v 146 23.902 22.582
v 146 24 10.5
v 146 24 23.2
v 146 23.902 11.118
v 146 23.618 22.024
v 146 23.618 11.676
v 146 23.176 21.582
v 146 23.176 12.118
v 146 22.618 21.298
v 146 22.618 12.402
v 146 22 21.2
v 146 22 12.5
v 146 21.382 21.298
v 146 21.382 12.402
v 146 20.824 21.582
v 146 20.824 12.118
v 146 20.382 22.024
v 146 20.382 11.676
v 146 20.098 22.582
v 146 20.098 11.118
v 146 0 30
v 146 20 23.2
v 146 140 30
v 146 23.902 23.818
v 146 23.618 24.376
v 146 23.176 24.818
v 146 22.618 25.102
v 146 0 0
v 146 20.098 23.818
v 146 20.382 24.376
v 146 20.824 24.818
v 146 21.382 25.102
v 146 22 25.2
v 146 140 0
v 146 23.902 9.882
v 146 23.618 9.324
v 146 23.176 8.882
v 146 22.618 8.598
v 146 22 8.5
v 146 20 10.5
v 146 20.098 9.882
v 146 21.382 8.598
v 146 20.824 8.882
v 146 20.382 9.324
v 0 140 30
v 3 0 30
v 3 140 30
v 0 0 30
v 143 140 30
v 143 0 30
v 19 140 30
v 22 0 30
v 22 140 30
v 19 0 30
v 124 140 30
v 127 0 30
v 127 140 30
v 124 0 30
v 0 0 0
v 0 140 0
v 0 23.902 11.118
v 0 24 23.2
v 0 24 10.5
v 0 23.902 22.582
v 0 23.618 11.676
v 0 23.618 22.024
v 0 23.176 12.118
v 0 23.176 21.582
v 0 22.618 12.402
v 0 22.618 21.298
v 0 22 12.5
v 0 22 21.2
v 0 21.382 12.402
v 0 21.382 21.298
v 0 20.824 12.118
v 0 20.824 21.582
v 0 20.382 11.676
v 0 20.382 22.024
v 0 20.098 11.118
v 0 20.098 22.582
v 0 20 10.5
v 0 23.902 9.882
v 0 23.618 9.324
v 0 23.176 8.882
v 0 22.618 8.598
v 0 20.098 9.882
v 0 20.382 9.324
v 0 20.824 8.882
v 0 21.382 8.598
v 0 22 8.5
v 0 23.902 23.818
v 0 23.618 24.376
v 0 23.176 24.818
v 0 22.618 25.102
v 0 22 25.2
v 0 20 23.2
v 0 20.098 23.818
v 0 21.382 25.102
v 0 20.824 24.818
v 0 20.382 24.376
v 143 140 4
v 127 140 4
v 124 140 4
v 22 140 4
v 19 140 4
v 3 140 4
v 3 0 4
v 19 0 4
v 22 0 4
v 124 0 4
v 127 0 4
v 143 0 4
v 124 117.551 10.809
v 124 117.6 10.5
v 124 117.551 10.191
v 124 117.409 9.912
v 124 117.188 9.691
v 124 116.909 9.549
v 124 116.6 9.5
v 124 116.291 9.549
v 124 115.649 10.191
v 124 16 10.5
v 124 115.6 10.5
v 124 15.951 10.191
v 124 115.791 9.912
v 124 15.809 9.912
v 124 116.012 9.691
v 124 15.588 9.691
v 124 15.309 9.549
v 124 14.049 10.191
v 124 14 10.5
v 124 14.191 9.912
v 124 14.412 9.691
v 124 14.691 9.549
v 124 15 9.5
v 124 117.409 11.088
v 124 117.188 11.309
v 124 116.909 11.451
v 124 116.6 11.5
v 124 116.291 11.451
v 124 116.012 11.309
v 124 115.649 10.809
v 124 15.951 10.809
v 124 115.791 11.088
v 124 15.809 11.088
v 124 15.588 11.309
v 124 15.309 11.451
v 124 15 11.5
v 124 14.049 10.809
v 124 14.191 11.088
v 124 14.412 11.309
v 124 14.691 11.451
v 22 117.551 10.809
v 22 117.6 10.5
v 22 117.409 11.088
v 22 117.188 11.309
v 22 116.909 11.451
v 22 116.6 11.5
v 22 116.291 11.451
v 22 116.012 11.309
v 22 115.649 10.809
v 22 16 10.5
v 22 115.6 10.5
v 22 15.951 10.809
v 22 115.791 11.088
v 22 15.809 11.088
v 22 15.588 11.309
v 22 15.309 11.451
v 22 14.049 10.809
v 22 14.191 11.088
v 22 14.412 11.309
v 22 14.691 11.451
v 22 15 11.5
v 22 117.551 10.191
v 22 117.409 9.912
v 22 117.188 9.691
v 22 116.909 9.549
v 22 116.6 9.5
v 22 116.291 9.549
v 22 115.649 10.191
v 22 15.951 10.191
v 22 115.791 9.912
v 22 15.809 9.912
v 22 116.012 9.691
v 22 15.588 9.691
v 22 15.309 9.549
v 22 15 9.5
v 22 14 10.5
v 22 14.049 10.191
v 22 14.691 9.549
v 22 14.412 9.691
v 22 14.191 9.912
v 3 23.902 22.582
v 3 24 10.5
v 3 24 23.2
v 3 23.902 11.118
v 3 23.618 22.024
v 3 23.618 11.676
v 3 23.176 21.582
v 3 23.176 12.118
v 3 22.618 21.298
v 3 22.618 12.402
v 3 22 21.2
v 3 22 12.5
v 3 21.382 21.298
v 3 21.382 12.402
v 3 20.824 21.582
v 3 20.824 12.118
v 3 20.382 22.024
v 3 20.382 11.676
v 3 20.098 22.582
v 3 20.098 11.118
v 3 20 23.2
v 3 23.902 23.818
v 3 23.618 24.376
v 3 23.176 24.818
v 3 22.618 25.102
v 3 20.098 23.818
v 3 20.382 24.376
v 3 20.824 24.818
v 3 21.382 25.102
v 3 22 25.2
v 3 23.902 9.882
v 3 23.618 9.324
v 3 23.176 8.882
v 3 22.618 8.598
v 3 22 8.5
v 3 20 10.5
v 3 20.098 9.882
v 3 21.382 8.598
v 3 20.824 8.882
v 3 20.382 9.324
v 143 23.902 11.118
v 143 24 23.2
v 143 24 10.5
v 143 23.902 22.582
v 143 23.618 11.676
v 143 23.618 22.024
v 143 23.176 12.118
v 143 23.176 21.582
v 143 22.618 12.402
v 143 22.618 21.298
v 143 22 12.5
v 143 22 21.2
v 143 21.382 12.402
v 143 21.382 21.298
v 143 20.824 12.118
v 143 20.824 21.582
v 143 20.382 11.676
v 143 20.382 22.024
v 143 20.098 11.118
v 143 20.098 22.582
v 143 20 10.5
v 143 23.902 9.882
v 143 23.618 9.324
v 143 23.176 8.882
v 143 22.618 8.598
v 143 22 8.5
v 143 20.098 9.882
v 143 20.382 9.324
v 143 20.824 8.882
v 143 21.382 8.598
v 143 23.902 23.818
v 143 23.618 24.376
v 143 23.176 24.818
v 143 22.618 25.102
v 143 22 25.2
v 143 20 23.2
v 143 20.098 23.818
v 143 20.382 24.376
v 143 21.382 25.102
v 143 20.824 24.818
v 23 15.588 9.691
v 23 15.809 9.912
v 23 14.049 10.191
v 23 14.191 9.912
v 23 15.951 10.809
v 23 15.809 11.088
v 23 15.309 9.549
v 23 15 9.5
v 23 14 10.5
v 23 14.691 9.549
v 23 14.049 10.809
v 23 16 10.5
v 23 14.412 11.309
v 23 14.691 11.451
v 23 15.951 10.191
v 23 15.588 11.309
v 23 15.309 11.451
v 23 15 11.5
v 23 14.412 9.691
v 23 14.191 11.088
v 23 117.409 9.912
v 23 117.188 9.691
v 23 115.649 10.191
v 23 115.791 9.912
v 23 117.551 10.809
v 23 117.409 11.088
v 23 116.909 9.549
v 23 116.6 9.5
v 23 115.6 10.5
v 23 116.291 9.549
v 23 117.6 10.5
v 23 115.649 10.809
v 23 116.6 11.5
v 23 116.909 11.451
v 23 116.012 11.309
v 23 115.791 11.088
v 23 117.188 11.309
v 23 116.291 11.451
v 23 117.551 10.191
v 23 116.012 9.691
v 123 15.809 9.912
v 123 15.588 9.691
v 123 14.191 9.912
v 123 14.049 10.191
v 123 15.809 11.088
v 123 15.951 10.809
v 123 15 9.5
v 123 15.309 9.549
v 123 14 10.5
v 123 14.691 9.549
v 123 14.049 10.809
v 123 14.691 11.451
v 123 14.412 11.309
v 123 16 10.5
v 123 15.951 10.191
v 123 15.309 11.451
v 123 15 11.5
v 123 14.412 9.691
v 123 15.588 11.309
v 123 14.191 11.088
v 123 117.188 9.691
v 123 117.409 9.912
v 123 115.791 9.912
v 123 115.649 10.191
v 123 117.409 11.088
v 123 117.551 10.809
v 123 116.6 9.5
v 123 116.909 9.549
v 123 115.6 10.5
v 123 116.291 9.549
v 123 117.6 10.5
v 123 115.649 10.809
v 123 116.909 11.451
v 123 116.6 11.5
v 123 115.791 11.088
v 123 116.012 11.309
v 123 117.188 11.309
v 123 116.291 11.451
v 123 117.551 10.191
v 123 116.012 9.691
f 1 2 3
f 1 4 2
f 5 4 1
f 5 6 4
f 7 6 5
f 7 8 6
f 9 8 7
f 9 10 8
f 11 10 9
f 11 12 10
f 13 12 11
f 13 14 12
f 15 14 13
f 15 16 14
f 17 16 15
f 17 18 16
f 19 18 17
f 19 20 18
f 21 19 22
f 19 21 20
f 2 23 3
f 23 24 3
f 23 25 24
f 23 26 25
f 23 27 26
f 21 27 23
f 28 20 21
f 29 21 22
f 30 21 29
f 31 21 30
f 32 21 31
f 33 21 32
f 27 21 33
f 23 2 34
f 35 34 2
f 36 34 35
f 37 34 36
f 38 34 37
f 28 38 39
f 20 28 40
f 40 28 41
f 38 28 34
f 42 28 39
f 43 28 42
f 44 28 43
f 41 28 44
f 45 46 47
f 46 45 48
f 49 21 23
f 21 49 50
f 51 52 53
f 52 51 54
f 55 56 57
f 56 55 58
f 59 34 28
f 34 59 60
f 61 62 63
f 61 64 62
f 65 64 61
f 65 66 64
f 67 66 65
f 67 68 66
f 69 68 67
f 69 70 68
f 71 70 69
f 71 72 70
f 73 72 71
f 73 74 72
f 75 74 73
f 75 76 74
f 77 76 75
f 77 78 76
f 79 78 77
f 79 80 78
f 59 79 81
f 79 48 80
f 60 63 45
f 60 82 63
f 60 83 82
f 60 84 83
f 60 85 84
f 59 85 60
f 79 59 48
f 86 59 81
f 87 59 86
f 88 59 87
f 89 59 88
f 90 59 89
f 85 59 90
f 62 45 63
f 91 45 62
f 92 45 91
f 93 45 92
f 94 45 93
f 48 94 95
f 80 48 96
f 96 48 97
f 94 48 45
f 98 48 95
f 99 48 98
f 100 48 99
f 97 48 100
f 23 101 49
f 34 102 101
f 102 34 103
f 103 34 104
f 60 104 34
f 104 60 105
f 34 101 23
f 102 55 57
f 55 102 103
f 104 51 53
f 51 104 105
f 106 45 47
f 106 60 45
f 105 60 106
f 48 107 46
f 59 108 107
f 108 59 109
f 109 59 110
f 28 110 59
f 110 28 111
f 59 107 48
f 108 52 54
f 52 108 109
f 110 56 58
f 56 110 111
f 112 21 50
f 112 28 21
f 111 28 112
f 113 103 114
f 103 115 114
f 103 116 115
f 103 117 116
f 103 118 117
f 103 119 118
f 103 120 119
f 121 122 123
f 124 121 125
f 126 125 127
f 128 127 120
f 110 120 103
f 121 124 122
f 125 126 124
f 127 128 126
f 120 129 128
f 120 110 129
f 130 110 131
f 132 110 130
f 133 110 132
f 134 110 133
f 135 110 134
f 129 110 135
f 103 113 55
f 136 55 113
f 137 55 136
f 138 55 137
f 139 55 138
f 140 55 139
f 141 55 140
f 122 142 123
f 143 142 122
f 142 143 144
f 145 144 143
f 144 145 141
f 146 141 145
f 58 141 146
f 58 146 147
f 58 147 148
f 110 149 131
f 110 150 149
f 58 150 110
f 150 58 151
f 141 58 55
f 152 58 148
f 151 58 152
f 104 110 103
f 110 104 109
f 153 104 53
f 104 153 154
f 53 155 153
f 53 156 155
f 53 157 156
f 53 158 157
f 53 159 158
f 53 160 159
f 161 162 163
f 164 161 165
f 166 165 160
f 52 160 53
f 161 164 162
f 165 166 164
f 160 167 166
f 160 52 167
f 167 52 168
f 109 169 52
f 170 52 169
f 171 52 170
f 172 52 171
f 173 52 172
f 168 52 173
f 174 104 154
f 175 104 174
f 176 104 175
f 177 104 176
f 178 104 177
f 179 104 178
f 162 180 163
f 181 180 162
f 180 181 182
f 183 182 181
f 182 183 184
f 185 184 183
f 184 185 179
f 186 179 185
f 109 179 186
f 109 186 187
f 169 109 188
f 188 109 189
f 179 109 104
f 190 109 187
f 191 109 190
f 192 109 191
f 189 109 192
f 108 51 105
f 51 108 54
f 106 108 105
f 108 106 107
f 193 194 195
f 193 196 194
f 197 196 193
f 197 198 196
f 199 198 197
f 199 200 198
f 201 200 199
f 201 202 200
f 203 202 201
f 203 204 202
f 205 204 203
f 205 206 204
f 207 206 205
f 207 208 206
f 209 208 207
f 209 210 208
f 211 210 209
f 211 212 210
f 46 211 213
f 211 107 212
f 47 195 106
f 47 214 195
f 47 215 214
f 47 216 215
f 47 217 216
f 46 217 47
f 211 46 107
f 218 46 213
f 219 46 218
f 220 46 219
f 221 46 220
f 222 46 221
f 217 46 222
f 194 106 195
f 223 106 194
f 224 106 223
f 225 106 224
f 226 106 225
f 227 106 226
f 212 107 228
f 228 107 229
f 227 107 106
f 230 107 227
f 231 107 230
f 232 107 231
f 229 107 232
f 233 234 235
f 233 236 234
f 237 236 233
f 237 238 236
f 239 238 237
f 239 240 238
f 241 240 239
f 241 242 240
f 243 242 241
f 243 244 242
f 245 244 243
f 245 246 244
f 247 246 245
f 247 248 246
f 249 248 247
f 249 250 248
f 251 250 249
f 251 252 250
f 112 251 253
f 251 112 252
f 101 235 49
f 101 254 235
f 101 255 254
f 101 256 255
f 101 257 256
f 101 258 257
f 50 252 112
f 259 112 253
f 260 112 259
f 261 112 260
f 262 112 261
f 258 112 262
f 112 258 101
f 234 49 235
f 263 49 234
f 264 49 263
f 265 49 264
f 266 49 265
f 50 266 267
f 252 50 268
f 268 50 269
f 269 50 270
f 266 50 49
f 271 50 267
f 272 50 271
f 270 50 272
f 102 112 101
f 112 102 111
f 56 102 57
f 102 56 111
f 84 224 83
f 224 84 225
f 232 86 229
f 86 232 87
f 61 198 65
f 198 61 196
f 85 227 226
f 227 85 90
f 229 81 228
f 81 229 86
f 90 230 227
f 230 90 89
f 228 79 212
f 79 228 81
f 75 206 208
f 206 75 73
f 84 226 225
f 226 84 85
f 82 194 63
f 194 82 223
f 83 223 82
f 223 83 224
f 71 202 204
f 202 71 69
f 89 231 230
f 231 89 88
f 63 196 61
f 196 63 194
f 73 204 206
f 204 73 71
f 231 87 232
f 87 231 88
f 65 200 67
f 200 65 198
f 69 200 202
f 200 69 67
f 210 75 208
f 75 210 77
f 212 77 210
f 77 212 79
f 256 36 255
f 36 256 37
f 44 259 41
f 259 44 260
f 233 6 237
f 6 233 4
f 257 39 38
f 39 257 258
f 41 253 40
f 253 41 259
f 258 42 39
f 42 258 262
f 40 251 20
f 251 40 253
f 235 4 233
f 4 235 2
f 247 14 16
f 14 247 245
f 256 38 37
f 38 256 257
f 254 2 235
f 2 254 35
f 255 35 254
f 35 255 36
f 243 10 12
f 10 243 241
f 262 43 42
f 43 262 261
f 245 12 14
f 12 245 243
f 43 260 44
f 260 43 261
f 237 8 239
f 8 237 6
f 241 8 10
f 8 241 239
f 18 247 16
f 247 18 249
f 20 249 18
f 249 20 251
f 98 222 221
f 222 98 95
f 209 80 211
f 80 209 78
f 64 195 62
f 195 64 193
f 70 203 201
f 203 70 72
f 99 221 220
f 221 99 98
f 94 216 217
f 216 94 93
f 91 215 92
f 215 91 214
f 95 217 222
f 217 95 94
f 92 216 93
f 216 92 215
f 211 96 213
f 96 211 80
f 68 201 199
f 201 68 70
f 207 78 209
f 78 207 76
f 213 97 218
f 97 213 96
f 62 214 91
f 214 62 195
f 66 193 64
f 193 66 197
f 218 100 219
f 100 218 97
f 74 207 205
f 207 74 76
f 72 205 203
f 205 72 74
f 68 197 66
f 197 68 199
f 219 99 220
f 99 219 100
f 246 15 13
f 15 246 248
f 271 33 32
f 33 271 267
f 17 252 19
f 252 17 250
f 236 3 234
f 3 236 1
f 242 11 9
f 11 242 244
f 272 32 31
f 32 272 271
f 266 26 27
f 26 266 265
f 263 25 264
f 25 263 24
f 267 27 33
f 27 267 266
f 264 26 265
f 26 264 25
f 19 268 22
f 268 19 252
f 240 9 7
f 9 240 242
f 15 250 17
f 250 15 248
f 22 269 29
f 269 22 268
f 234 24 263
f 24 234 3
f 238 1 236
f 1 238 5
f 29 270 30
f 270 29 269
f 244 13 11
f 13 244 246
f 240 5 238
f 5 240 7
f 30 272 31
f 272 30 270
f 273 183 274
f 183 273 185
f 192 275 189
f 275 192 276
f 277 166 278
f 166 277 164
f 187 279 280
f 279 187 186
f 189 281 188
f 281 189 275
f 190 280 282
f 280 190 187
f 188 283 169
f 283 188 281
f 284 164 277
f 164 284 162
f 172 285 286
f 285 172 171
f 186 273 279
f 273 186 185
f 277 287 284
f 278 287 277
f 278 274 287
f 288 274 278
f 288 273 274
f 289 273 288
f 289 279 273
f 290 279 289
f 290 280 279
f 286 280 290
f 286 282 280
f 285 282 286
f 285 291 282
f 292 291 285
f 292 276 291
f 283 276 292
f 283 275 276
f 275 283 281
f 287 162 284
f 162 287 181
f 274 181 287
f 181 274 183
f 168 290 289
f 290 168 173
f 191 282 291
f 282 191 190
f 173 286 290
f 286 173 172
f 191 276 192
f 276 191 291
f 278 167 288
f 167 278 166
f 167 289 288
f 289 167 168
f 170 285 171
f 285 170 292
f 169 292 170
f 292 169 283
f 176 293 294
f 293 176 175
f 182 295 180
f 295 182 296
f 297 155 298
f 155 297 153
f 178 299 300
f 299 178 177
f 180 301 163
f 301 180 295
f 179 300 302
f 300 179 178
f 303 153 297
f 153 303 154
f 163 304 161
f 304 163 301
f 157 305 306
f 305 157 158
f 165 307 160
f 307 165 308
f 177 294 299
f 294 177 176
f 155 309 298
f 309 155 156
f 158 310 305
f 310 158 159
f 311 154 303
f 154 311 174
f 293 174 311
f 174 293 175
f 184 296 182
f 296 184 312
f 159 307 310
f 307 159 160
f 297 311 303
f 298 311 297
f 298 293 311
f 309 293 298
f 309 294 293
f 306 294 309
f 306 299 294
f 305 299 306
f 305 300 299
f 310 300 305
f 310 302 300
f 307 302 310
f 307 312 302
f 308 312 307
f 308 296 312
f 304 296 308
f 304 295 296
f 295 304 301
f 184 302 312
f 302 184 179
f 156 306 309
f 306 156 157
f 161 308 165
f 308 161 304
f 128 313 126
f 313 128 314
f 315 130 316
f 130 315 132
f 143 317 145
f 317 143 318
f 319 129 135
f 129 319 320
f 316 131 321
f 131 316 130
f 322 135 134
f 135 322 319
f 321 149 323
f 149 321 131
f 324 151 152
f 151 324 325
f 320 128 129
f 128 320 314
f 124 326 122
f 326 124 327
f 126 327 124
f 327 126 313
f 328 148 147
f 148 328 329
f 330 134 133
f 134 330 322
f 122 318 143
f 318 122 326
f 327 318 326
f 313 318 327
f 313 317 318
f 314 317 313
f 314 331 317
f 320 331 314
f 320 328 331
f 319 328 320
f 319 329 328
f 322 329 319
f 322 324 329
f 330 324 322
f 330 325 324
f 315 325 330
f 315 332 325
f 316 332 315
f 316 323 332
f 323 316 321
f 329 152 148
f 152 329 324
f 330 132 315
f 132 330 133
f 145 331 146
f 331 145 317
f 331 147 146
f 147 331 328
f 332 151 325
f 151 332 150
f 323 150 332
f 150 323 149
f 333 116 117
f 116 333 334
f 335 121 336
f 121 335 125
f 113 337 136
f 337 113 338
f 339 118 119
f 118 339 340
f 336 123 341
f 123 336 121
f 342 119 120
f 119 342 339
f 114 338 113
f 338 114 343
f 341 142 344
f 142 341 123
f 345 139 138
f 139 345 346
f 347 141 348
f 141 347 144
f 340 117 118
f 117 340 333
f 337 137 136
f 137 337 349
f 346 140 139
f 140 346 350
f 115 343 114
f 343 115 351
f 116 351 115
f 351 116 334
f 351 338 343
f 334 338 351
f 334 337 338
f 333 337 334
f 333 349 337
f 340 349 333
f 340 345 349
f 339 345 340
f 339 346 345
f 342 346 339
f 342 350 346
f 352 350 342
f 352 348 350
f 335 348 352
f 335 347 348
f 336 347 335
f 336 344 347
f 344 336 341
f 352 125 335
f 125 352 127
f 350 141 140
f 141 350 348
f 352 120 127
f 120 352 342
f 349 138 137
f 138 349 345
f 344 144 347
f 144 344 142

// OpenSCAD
// Overall Outter frame dimensions.  Should match that of 5.25" drive 
OHeight = 30;
OWidth = 146;
ODepth = 140;

//  Settings for internal size.  Should fit a 3.5" HDD
IWidth = 102;
BedThickness = 4;
WallThickness = 3;

// Settings for the depth of the outter screw holes.
OSDepth1 = 22;
OSHeight1 = 10.5;
OSHeight2 = OSHeight1 + 12.7;
OSDiamater = 4;

// Inner screw hols are harder...  need to make screwdriver space outside before creating inner hole.
HDDepth1 = 15;
HDDepth2 = HDDepth1 + 60;
HDDepth3 = HDDepth2 + 41.6;
HDHeight = BedThickness + 6.5;
NubLength = 1;
NubWidth = 2;


//  Some caluculations used later.
Spacing = ((OWidth-IWidth)/2)-(2*WallThickness);
echo(Spacing);

difference(){
    // Primary shell
    cube([OWidth,ODepth,OHeight]);
    // Cutout for the HDD
    translate([(OWidth-IWidth)/2,-.1,BedThickness])cube([IWidth,ODepth+.2,OHeight-BedThickness+.1]);
    // Cutout for the left supports
    translate([WallThickness,-.1,BedThickness])cube([Spacing,ODepth+.2,OHeight-BedThickness+.1]);
    // Cutout for the right supports
    translate([OWidth-WallThickness-Spacing,-.1,BedThickness])cube([Spacing,ODepth+.2,OHeight-BedThickness+.1]);
    // Outer mounting holes
    translate([-.1,OSDepth1,OSHeight1])rotate([0,90,0])cylinder(d=OSDiamater, h=WallThickness+.2, $fn=20);
    translate([OWidth-WallThickness-.1,OSDepth1,OSHeight1])rotate([0,90,0])cylinder(d=OSDiamater, h=WallThickness+.2, $fn=20);
    translate([-.1,OSDepth1,OSHeight2])rotate([0,90,0])cylinder(d=OSDiamater, h=WallThickness+.2, $fn=20);
    translate([OWidth-WallThickness-.1,OSDepth1,OSHeight2])rotate([0,90,0])cylinder(d=OSDiamater, h=WallThickness+.2, $fn=20);
}
// Hard drive nubs
translate([Spacing+(2*WallThickness),HDDepth1,HDHeight])rotate([0,90,0])cylinder(d=NubWidth, h=NubLength, $fn=20);
translate([Spacing+(2*WallThickness),HDDepth3,HDHeight])rotate([0,90,0])cylinder(d=NubWidth, h=NubLength, $fn=20);
translate([IWidth+(2*WallThickness)+Spacing-NubLength,HDDepth1,HDHeight])rotate([0,90,0])cylinder(d=NubWidth, h=NubLength, $fn=20);
translate([IWidth+(2*WallThickness)+Spacing-NubLength,HDDepth3,HDHeight])rotate([0,90,0])cylinder(d=NubWidth, h=NubLength, $fn=20);
